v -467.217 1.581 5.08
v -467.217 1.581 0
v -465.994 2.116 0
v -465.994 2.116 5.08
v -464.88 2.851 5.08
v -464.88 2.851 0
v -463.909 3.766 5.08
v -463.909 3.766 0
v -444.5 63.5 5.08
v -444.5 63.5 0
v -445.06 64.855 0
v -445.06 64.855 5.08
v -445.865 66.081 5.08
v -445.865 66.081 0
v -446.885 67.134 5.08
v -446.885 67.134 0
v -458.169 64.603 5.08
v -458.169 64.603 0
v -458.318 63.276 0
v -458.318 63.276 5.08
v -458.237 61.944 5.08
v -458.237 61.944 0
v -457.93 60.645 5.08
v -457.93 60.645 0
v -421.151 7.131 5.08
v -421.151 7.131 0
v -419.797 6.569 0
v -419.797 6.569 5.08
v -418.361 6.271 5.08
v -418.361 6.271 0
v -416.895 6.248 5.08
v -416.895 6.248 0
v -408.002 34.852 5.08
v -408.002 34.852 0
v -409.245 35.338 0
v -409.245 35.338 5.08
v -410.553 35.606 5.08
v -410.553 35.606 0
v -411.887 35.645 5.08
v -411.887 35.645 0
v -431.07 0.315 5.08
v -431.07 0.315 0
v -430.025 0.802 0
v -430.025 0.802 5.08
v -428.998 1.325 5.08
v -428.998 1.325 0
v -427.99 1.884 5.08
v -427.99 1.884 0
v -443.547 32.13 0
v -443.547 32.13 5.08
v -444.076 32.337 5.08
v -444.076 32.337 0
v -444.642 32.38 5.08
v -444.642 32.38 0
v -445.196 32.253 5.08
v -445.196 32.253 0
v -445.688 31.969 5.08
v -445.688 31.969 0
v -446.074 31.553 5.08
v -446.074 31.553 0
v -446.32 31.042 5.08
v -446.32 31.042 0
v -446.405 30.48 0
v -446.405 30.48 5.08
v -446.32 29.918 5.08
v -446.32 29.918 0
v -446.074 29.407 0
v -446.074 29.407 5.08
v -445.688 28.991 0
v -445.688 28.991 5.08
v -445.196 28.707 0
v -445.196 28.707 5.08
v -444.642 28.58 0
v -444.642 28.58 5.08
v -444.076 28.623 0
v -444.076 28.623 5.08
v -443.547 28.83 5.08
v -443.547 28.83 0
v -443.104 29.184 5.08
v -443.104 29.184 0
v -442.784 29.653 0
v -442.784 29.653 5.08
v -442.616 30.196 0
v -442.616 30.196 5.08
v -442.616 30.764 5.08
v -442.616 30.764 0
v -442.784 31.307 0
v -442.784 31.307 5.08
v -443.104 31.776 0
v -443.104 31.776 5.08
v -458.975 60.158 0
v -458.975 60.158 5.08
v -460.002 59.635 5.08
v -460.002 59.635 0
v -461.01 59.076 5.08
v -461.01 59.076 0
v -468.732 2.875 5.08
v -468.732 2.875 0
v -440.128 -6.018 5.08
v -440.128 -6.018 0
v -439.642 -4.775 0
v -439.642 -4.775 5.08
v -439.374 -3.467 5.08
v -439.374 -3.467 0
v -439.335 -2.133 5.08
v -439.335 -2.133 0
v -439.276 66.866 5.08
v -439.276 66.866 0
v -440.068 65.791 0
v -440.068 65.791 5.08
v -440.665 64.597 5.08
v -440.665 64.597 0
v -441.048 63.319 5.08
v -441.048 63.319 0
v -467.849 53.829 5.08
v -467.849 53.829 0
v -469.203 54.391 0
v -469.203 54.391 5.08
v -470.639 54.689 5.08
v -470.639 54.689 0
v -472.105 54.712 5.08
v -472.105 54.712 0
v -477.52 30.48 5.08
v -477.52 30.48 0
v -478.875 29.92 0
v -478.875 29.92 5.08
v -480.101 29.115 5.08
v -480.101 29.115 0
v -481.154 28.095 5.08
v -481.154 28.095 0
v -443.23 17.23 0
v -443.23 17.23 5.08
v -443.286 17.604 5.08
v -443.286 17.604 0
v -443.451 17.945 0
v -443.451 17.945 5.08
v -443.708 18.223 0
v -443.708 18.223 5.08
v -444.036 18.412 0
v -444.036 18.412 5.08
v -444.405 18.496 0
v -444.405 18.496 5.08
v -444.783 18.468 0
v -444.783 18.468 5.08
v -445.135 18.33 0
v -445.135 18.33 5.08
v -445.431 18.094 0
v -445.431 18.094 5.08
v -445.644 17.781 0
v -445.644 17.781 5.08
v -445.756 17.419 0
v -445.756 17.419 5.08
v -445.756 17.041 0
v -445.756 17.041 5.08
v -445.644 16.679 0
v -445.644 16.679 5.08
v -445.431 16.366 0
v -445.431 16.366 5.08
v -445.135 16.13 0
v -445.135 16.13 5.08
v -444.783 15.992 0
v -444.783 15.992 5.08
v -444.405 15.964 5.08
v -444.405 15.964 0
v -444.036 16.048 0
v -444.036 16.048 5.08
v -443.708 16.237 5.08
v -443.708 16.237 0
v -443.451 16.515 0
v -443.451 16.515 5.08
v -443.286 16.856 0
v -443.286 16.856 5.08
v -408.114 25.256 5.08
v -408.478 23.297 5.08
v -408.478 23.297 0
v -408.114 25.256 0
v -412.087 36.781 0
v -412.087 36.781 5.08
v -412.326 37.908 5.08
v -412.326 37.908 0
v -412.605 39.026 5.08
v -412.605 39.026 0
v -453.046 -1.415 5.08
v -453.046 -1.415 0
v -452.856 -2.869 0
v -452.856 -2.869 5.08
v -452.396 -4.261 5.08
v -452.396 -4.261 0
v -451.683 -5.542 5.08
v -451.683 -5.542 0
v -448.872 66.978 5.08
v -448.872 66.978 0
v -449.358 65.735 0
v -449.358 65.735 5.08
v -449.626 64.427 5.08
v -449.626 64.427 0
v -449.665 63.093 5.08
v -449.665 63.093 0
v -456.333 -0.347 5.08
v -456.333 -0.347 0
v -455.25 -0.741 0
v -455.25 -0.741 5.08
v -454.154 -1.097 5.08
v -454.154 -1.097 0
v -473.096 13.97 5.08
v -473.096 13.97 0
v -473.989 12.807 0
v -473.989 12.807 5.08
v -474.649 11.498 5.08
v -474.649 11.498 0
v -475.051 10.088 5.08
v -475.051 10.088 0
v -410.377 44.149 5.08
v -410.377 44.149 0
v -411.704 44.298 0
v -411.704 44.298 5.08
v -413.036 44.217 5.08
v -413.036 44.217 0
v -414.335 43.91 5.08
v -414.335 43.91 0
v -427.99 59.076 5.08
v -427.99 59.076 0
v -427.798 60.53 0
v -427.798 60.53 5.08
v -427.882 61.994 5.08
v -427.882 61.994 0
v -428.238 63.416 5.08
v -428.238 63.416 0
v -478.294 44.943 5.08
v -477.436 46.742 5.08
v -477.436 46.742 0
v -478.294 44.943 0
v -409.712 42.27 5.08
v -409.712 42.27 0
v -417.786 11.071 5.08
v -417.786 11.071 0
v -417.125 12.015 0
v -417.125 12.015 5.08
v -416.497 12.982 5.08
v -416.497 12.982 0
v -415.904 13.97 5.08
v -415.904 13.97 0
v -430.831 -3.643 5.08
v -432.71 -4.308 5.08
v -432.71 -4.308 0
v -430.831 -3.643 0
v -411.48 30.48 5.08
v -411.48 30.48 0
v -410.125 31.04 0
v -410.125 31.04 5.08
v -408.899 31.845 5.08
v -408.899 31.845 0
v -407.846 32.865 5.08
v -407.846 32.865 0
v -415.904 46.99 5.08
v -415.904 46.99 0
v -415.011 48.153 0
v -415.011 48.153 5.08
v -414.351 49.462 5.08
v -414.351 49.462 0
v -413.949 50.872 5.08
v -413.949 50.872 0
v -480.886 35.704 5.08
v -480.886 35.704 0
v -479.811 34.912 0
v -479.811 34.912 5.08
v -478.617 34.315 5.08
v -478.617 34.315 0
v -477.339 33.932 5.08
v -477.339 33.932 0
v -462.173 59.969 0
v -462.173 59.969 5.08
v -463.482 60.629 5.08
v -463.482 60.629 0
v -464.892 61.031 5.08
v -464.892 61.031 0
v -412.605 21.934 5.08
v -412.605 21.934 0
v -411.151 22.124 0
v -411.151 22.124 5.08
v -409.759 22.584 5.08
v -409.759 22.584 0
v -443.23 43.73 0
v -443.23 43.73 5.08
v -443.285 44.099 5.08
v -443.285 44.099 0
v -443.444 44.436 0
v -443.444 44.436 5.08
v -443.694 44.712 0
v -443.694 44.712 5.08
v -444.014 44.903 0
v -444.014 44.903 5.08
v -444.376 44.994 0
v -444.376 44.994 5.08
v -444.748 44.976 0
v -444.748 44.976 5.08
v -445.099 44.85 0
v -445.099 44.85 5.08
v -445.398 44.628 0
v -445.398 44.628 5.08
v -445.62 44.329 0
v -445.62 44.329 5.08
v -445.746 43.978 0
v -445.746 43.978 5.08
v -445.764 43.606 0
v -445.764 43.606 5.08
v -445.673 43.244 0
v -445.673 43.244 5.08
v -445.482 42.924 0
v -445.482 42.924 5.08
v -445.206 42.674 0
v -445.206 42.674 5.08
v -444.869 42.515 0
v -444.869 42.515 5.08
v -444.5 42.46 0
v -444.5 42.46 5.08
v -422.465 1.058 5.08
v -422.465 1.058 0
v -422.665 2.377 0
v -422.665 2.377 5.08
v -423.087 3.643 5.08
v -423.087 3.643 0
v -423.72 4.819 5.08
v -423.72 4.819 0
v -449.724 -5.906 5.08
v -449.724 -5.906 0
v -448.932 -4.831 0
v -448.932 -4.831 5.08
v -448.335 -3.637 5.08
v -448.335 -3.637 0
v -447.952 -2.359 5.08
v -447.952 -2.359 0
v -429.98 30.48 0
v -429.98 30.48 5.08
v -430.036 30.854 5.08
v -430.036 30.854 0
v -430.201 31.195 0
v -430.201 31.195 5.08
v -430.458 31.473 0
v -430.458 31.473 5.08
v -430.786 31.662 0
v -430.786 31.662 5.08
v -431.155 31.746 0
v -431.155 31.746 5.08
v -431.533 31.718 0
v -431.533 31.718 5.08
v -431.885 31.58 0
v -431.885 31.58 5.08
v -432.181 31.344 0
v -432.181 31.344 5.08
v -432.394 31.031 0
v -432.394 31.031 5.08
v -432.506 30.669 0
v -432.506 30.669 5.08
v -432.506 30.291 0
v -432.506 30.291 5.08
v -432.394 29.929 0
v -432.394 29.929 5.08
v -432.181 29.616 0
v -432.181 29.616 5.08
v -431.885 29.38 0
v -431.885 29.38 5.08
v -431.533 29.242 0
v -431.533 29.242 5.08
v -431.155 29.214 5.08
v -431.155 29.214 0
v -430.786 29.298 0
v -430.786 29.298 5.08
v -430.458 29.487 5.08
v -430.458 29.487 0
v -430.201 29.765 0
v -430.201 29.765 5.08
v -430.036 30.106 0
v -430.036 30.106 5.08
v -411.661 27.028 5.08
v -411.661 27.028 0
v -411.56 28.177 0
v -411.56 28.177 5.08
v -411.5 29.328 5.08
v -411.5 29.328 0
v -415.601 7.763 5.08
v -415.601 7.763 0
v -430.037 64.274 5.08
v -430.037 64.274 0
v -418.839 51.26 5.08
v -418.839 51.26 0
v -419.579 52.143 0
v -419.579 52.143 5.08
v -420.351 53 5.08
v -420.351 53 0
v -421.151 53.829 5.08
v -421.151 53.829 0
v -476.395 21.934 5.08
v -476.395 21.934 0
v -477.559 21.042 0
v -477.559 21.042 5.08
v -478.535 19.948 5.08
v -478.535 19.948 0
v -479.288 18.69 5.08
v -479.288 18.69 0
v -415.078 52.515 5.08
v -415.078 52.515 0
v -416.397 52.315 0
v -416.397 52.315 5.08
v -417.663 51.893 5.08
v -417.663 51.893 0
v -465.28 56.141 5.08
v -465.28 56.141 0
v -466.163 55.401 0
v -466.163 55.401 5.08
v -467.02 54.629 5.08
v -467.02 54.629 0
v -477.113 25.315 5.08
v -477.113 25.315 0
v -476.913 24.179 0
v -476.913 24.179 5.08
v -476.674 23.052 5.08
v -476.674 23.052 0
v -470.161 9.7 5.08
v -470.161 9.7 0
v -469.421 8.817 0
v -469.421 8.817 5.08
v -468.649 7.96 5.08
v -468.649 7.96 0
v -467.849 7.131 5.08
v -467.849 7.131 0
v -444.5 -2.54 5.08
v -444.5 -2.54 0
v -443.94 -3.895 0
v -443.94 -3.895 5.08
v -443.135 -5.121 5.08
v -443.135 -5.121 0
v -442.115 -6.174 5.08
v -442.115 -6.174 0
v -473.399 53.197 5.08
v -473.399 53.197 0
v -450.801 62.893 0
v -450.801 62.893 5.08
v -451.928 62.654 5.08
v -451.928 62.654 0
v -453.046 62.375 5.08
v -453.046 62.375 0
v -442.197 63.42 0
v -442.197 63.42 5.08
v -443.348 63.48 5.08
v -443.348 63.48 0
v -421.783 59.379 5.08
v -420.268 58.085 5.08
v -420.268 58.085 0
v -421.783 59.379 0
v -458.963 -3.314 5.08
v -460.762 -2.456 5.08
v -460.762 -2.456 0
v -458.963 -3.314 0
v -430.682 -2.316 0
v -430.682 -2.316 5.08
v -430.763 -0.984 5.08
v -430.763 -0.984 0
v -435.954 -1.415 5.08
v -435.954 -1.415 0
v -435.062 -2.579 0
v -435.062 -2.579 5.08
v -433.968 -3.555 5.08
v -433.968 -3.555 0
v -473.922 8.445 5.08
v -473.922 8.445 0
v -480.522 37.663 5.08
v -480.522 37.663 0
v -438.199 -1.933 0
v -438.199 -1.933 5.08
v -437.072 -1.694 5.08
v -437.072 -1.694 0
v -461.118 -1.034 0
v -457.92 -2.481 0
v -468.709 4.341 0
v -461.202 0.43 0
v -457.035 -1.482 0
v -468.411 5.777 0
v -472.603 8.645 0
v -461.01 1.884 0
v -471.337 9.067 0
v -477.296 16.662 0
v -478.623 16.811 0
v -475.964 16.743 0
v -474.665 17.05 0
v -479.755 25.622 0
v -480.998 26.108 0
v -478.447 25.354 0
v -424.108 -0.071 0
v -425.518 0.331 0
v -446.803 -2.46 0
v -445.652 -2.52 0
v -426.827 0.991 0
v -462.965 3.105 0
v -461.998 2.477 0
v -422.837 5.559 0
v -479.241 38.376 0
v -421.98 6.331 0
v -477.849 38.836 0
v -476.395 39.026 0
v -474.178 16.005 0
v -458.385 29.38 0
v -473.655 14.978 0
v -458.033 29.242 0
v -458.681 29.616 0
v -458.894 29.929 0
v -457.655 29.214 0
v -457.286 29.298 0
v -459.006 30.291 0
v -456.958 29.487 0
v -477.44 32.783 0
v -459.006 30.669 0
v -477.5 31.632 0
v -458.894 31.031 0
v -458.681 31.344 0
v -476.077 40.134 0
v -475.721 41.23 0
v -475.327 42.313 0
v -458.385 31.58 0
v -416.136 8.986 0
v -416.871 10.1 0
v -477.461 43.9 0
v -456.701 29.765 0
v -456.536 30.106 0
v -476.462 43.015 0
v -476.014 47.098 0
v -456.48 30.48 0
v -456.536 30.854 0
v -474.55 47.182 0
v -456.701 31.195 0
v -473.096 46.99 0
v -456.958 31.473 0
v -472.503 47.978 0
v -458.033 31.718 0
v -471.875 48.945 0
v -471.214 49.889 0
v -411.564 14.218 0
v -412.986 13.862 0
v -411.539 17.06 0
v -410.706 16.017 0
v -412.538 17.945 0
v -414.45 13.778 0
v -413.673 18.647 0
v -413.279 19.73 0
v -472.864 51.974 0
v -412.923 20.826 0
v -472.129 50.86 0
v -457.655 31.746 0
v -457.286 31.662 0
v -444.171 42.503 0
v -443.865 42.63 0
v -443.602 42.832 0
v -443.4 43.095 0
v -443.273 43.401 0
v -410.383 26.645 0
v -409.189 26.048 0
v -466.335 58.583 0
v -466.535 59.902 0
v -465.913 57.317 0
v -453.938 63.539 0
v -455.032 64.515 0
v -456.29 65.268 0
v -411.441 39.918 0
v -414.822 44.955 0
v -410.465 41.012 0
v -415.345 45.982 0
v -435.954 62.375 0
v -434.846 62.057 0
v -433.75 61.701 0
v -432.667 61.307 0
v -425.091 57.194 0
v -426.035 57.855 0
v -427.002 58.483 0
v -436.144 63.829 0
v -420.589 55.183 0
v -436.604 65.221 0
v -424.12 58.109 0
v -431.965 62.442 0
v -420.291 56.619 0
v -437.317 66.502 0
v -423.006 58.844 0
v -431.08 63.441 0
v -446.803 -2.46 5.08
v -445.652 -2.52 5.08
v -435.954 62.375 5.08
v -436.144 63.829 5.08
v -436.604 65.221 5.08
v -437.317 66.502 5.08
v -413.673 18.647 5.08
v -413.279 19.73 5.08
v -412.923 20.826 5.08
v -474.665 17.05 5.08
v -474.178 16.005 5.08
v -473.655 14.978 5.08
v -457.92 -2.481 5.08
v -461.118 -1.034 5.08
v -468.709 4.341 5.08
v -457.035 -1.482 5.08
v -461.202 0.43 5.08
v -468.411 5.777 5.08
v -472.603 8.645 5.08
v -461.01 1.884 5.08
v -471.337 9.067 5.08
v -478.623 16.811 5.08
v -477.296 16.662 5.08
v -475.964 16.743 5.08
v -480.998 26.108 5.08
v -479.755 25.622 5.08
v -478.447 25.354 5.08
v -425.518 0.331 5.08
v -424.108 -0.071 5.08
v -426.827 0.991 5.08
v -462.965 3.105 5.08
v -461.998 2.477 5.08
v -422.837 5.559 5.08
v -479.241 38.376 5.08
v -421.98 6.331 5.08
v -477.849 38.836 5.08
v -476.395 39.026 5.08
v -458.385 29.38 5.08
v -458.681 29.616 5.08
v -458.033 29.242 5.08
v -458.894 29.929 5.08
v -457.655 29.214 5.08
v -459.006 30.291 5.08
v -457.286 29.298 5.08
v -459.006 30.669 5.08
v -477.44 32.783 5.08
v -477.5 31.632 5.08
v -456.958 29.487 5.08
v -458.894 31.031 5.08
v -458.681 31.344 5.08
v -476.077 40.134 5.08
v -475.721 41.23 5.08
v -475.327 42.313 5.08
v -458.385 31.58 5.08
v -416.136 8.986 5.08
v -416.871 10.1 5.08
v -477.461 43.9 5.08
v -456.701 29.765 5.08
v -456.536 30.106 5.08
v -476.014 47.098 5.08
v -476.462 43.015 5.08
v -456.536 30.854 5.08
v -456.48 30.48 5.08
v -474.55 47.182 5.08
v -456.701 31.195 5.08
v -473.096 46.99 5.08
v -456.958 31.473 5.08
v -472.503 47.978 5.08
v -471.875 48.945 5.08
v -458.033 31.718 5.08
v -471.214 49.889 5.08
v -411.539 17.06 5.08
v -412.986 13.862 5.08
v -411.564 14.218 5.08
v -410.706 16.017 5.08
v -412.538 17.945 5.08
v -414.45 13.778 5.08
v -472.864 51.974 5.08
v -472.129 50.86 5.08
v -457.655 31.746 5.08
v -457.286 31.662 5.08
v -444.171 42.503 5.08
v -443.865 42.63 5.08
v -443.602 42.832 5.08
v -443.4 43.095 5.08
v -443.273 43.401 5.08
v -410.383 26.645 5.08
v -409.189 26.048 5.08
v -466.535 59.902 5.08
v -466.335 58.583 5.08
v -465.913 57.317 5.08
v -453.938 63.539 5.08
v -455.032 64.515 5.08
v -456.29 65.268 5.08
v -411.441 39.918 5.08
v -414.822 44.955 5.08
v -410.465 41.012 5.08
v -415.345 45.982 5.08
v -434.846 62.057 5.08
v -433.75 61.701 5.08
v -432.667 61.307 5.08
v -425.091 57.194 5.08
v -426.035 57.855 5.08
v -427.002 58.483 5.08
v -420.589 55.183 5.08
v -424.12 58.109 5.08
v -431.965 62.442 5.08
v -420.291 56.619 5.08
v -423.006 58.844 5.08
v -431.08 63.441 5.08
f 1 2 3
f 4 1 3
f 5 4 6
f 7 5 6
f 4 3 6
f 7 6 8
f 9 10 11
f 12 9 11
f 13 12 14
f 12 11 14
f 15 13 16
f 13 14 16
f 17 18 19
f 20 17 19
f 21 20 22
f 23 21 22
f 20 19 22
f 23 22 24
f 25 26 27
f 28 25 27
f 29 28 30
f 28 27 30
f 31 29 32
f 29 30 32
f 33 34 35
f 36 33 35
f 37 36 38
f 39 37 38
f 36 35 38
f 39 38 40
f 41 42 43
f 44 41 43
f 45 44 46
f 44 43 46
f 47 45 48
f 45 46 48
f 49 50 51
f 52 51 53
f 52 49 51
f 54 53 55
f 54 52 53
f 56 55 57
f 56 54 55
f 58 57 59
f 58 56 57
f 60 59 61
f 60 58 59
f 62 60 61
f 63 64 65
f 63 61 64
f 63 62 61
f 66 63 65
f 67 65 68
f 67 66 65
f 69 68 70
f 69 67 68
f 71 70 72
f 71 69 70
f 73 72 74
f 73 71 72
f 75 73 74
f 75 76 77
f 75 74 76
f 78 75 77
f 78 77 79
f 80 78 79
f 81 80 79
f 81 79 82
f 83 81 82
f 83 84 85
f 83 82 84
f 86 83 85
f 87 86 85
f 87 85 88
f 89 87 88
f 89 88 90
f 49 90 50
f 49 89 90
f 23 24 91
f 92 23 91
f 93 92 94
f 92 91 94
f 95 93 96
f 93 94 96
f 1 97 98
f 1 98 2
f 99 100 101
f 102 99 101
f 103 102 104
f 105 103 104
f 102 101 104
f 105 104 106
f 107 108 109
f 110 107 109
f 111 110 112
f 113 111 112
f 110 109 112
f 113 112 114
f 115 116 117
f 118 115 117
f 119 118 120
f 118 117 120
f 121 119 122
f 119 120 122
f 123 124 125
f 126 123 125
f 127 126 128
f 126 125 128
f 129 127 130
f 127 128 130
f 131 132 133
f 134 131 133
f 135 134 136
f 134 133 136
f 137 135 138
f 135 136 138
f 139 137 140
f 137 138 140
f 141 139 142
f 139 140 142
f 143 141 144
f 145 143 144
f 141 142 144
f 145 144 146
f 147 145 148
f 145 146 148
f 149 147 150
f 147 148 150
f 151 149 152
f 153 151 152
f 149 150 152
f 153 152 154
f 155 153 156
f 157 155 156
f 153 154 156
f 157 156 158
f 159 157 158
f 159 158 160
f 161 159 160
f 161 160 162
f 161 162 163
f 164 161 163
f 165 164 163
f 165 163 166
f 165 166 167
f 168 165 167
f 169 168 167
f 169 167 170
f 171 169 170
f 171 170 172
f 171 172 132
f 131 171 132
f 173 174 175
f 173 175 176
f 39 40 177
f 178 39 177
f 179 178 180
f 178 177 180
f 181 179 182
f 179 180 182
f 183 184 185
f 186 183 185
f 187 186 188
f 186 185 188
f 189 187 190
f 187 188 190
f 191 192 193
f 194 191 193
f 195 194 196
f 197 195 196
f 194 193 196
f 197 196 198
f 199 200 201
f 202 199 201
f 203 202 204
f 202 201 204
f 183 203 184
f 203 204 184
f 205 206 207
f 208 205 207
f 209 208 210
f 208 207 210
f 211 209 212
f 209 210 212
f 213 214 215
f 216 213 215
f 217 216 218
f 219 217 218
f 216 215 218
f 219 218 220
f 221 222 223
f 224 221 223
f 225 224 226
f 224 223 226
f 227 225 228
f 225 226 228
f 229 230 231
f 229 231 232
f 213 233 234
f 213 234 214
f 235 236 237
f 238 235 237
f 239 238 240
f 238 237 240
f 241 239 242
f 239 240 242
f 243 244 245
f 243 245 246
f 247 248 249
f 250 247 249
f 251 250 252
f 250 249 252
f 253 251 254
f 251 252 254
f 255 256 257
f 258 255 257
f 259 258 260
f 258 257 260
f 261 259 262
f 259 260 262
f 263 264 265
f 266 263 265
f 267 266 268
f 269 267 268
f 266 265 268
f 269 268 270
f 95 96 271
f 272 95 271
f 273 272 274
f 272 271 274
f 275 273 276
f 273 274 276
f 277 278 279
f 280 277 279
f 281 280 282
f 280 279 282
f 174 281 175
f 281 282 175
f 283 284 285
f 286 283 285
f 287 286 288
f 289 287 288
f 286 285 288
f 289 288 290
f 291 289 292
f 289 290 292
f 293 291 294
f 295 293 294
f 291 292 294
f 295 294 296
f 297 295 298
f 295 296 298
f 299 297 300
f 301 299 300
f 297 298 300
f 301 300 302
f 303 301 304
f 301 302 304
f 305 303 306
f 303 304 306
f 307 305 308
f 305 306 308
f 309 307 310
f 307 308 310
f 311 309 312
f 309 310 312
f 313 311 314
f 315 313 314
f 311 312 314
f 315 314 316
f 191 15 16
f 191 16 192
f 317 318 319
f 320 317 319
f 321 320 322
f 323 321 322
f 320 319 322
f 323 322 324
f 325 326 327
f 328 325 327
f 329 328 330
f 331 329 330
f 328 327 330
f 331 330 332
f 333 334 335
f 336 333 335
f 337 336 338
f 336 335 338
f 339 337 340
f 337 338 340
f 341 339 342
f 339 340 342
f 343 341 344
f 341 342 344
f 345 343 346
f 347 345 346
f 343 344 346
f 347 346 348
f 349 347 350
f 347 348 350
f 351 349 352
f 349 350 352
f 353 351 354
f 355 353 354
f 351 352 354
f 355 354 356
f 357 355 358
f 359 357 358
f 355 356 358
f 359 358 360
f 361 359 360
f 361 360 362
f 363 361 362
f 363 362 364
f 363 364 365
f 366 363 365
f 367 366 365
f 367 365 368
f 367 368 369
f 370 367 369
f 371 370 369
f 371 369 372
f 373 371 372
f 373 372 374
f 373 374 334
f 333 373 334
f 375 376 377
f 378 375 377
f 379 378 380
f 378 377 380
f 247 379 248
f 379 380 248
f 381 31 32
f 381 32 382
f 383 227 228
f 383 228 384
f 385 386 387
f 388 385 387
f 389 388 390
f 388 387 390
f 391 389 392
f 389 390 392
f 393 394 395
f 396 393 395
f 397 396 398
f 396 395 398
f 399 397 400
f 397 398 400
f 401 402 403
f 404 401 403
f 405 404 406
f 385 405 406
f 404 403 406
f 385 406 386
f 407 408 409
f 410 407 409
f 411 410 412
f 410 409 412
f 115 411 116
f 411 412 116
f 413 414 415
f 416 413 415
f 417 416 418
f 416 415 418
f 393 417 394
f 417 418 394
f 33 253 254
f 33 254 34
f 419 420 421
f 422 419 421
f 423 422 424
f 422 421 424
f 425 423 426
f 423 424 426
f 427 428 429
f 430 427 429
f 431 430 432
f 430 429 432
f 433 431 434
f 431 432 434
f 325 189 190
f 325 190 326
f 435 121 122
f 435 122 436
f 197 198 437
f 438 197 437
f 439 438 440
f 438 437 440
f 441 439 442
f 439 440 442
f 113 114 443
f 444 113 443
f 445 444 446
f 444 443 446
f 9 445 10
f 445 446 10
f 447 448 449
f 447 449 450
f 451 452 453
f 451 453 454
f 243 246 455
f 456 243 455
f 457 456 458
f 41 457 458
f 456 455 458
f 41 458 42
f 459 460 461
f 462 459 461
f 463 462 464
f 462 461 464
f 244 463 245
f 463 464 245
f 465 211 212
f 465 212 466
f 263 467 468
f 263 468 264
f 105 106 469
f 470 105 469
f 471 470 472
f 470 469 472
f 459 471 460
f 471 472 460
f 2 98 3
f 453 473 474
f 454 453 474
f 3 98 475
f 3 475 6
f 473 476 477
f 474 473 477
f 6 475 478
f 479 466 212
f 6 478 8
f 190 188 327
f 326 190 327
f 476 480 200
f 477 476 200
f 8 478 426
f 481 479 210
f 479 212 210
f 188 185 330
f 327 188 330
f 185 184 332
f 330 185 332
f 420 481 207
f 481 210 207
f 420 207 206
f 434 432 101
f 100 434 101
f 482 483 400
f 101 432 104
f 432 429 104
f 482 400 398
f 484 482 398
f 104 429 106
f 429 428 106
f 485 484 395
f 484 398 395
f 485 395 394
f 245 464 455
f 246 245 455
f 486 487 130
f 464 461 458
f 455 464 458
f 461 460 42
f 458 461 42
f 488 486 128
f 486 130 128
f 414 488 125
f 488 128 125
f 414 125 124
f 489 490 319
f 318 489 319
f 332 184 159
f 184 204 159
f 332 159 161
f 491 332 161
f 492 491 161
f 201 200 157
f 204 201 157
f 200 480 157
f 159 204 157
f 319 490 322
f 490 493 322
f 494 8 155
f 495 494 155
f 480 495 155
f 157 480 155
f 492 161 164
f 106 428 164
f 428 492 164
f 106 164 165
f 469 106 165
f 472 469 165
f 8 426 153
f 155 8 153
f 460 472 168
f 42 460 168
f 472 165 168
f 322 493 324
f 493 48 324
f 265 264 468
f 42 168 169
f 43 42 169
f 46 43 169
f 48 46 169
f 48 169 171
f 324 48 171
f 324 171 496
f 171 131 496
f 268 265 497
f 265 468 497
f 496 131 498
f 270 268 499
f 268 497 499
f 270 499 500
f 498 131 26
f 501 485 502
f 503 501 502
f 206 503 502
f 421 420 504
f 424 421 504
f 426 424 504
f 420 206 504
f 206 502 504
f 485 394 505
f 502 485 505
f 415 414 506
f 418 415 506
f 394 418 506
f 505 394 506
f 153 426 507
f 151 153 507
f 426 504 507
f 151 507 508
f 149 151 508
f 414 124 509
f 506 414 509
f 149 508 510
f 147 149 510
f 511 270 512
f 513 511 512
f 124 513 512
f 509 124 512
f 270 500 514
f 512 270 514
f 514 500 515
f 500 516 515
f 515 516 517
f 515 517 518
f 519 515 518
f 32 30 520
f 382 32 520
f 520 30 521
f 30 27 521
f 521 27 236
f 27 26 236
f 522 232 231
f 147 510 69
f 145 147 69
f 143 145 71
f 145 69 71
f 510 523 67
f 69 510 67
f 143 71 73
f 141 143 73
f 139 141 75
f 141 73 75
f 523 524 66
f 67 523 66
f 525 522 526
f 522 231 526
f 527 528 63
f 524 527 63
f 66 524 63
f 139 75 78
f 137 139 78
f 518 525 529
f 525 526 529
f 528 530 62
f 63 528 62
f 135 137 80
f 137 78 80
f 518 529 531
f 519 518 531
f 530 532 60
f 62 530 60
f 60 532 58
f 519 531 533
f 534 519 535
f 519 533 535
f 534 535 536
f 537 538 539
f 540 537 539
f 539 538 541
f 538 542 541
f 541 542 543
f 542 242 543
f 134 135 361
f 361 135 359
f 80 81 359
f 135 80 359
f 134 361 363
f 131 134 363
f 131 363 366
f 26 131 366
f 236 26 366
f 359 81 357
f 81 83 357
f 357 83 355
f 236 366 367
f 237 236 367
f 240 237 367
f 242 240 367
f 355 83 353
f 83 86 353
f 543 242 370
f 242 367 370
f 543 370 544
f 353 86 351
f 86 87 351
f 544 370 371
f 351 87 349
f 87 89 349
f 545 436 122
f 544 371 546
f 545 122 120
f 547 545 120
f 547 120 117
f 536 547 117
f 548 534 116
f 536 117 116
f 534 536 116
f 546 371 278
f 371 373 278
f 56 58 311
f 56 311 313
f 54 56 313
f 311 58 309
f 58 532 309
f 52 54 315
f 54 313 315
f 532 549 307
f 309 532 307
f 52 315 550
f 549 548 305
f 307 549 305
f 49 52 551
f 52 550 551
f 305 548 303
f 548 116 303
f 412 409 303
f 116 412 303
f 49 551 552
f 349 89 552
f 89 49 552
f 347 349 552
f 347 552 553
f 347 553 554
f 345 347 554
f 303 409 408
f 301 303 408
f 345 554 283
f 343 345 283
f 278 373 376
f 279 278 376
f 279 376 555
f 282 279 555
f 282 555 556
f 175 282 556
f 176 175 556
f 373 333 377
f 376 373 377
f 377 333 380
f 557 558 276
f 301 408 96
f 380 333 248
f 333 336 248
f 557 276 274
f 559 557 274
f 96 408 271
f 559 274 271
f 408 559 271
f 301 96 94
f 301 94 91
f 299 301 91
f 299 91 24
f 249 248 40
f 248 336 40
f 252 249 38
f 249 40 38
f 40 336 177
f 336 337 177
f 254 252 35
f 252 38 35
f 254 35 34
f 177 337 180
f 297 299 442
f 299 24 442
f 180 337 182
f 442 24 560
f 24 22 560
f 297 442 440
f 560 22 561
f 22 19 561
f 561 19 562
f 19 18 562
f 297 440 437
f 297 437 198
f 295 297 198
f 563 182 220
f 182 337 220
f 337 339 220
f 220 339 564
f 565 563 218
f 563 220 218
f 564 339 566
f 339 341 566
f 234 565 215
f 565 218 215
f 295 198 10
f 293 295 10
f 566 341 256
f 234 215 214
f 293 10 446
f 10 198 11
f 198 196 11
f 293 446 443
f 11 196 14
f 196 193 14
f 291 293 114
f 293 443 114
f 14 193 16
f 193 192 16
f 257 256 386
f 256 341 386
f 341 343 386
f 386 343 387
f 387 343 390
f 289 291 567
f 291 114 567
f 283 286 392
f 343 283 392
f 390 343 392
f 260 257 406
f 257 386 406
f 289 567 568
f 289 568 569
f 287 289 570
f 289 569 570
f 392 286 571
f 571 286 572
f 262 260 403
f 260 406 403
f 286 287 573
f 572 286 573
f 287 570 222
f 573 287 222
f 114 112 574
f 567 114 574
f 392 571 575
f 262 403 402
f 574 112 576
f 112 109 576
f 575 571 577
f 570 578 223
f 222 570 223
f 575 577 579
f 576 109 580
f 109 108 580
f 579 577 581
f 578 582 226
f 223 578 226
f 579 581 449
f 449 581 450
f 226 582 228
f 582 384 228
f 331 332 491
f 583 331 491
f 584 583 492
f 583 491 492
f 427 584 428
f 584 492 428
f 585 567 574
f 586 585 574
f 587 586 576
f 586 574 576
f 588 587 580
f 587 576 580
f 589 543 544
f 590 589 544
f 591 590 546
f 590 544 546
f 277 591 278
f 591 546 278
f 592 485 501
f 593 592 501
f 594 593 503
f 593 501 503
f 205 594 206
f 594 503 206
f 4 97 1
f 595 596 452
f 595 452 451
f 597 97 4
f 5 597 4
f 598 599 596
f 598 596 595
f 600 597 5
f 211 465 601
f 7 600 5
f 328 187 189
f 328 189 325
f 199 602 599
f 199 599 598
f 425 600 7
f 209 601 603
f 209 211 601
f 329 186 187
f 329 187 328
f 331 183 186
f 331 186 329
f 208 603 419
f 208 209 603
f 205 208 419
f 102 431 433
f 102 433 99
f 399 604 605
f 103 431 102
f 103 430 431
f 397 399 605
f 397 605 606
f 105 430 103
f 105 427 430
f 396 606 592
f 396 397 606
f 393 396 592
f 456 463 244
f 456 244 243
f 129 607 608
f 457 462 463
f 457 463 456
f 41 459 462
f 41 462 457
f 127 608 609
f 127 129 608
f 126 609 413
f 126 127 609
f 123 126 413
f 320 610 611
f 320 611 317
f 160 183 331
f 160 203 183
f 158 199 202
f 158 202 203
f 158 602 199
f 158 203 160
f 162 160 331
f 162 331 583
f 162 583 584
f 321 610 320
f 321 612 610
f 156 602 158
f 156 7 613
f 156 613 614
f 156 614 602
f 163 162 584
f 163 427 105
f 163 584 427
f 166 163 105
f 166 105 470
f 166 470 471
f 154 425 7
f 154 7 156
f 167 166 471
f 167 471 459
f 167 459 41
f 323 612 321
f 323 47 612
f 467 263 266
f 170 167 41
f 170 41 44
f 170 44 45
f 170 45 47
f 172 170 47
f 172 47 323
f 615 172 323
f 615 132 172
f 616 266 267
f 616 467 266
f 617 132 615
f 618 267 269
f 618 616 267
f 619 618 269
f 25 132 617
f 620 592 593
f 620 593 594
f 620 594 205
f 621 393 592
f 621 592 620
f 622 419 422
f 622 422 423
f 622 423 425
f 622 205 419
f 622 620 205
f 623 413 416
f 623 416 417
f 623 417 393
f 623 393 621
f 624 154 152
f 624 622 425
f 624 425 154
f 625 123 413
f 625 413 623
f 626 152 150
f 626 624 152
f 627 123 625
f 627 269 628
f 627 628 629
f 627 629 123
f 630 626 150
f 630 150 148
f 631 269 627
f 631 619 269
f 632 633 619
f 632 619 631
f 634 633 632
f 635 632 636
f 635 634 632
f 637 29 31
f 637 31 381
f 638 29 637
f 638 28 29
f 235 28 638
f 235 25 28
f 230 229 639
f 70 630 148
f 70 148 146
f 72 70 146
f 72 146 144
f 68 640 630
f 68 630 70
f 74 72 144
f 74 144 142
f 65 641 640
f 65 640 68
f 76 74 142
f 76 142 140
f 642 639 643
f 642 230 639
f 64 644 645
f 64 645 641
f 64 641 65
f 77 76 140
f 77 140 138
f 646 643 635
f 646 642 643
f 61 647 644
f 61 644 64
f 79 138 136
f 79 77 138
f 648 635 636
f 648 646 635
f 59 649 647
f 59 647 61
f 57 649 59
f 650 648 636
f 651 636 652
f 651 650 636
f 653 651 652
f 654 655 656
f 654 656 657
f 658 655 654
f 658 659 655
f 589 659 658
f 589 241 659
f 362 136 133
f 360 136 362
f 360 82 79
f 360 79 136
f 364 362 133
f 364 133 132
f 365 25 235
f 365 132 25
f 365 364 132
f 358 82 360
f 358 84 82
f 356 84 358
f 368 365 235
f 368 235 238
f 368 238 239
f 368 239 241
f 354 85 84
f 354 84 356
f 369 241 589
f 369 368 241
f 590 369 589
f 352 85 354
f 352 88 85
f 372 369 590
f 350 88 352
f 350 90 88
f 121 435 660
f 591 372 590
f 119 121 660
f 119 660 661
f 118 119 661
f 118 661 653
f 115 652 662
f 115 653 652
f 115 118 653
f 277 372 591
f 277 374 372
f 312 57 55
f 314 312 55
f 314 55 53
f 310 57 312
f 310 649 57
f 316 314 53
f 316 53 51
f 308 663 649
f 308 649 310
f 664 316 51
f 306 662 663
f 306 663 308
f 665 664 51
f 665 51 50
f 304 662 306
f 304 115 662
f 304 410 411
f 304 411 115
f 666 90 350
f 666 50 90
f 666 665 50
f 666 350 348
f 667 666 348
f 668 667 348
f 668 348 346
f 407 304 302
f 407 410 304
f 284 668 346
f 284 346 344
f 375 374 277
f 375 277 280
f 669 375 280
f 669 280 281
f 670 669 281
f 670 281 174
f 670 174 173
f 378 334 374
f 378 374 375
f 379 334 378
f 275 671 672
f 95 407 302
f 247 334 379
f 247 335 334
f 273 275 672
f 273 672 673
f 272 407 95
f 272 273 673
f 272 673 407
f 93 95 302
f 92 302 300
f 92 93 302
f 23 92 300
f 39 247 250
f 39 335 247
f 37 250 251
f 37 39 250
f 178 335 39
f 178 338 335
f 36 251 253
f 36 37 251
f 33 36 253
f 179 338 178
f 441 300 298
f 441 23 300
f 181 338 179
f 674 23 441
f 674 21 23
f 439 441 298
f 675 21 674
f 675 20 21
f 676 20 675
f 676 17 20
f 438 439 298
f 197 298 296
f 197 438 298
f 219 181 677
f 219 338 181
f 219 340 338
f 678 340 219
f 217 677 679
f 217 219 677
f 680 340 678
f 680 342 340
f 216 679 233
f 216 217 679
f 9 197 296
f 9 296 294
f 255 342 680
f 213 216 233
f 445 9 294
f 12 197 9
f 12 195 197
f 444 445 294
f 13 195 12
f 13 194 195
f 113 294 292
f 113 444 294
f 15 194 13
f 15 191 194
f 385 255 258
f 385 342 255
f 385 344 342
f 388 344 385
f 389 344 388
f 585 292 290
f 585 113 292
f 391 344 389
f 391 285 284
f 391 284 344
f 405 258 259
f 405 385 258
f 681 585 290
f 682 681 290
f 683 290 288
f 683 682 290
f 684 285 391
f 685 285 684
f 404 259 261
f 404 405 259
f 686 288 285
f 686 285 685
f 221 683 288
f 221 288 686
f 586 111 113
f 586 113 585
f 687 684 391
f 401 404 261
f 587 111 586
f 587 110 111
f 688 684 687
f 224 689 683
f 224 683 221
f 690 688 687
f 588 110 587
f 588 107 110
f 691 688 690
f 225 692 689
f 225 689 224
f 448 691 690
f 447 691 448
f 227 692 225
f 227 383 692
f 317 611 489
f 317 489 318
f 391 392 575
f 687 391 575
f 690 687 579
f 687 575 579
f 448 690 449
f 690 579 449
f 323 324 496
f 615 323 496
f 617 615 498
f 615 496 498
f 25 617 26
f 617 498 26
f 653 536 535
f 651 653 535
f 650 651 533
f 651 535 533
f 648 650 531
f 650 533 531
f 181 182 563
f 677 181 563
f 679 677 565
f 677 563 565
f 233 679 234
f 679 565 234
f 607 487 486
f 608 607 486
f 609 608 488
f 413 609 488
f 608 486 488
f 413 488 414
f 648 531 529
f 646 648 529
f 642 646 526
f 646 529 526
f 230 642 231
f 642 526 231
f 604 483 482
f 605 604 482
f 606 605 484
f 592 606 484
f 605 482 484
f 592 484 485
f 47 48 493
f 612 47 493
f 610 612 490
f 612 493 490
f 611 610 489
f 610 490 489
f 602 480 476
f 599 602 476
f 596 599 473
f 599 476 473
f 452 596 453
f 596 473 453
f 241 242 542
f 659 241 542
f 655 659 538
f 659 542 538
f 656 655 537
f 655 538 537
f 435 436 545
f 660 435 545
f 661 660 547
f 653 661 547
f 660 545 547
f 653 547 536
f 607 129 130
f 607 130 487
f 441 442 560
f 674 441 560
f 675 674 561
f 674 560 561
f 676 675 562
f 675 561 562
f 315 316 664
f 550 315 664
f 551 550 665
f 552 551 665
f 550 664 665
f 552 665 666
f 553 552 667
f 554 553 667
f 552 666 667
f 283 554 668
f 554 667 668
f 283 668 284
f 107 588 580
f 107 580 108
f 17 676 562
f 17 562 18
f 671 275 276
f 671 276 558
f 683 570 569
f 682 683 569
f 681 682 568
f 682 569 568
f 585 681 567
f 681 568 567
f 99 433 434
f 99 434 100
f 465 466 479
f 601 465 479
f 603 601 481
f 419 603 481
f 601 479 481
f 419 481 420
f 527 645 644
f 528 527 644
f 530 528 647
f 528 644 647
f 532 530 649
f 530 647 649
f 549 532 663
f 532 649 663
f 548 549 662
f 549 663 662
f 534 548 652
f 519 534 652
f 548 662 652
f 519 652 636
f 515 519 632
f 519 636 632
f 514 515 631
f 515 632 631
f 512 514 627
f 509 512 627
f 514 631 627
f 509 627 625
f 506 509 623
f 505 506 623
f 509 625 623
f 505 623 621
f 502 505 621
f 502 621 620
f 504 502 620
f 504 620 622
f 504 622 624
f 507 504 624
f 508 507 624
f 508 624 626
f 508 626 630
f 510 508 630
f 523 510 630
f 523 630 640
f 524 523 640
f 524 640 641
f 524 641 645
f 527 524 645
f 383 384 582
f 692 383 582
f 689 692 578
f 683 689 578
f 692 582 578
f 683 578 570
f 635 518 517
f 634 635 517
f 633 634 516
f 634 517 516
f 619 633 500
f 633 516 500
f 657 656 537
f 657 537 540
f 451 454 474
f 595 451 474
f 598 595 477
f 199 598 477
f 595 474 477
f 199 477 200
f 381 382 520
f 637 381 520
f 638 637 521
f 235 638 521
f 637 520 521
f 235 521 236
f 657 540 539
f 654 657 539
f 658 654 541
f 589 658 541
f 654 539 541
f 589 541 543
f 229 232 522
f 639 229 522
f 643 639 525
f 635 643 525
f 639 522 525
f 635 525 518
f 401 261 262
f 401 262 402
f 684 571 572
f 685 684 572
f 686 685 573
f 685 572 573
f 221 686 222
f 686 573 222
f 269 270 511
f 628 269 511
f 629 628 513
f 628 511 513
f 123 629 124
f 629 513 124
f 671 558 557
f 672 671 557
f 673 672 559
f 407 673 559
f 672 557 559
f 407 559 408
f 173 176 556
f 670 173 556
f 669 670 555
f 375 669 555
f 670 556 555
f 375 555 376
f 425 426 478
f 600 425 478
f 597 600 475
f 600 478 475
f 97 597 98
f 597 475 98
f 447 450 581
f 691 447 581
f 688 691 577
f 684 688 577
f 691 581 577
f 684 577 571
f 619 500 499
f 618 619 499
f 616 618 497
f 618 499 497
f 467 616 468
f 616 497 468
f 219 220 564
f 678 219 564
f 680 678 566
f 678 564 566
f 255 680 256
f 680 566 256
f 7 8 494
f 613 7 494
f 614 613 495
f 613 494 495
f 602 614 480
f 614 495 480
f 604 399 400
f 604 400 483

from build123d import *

# Parameters (mm, degrees)
F0_R     = 1.905
F1_DEPTH = 5.08
F2_COUNT = 24
F5_R     = 1.27
F6_DEPTH = 25.4


with BuildPart() as f1:
    # F0 (on Top) → F1 (new body)
    with BuildSketch(Plane.XY):
        with BuildLine():
            ThreePointArc((-408.002278, 34.8517), (-409.893011, 35.500075), (-411.88653, 35.645465))
            ThreePointArc((-411.88653, 35.645465), (-477.41821, 27.88928), (-411.479999, 30.479999))
            ThreePointArc((-411.479999, 30.479999), (-409.493063, 31.413613), (-407.84592, 32.864982))
            Line((-407.84592, 32.864982), (-408.002278, 34.8517))
        make_face()
        with Locations((-444.499999, 30.479999)):
            Circle(F0_R, mode=Mode.SUBTRACT)
    extrude(amount=F1_DEPTH)


with BuildPart() as f2_1:
    # F2: instance of F1
    add(f1.part.rotate(Axis((-444.499999, 30.479999, 0), (0, 0, -1)), 1 * 360 / F2_COUNT))


with BuildPart() as f2_2:
    # F2: instance of F1
    add(f1.part.rotate(Axis((-444.499999, 30.479999, 0), (0, 0, -1)), 2 * 360 / F2_COUNT))


with BuildPart() as f2_3:
    # F2: instance of F1
    add(f1.part.rotate(Axis((-444.499999, 30.479999, 0), (0, 0, -1)), 3 * 360 / F2_COUNT))


with BuildPart() as f2_4:
    # F2: instance of F1
    add(f1.part.rotate(Axis((-444.499999, 30.479999, 0), (0, 0, -1)), 4 * 360 / F2_COUNT))


with BuildPart() as f2_5:
    # F2: instance of F1
    add(f1.part.rotate(Axis((-444.499999, 30.479999, 0), (0, 0, -1)), 5 * 360 / F2_COUNT))


with BuildPart() as f2_6:
    # F2: instance of F1
    add(f1.part.rotate(Axis((-444.499999, 30.479999, 0), (0, 0, -1)), 6 * 360 / F2_COUNT))


with BuildPart() as f2_7:
    # F2: instance of F1
    add(f1.part.rotate(Axis((-444.499999, 30.479999, 0), (0, 0, -1)), 7 * 360 / F2_COUNT))


with BuildPart() as f2_8:
    # F2: instance of F1
    add(f1.part.rotate(Axis((-444.499999, 30.479999, 0), (0, 0, -1)), 8 * 360 / F2_COUNT))


with BuildPart() as f2_9:
    # F2: instance of F1
    add(f1.part.rotate(Axis((-444.499999, 30.479999, 0), (0, 0, -1)), 9 * 360 / F2_COUNT))


with BuildPart() as f2_10:
    # F2: instance of F1
    add(f1.part.rotate(Axis((-444.499999, 30.479999, 0), (0, 0, -1)), 10 * 360 / F2_COUNT))


with BuildPart() as f2_11:
    # F2: instance of F1
    add(f1.part.rotate(Axis((-444.499999, 30.479999, 0), (0, 0, -1)), 11 * 360 / F2_COUNT))


with BuildPart() as f2_12:
    # F2: instance of F1
    add(f1.part.rotate(Axis((-444.499999, 30.479999, 0), (0, 0, -1)), 12 * 360 / F2_COUNT))


with BuildPart() as f2_13:
    # F2: instance of F1
    add(f1.part.rotate(Axis((-444.499999, 30.479999, 0), (0, 0, -1)), 13 * 360 / F2_COUNT))


with BuildPart() as f2_14:
    # F2: instance of F1
    add(f1.part.rotate(Axis((-444.499999, 30.479999, 0), (0, 0, -1)), 14 * 360 / F2_COUNT))


with BuildPart() as f2_15:
    # F2: instance of F1
    add(f1.part.rotate(Axis((-444.499999, 30.479999, 0), (0, 0, -1)), 15 * 360 / F2_COUNT))


with BuildPart() as f2_16:
    # F2: instance of F1
    add(f1.part.rotate(Axis((-444.499999, 30.479999, 0), (0, 0, -1)), 16 * 360 / F2_COUNT))


with BuildPart() as f2_17:
    # F2: instance of F1
    add(f1.part.rotate(Axis((-444.499999, 30.479999, 0), (0, 0, -1)), 17 * 360 / F2_COUNT))


with BuildPart() as f2_18:
    # F2: instance of F1
    add(f1.part.rotate(Axis((-444.499999, 30.479999, 0), (0, 0, -1)), 18 * 360 / F2_COUNT))


with BuildPart() as f2_19:
    # F2: instance of F1
    add(f1.part.rotate(Axis((-444.499999, 30.479999, 0), (0, 0, -1)), 19 * 360 / F2_COUNT))


with BuildPart() as f2_20:
    # F2: instance of F1
    add(f1.part.rotate(Axis((-444.499999, 30.479999, 0), (0, 0, -1)), 20 * 360 / F2_COUNT))


with BuildPart() as f2_21:
    # F2: instance of F1
    add(f1.part.rotate(Axis((-444.499999, 30.479999, 0), (0, 0, -1)), 21 * 360 / F2_COUNT))


with BuildPart() as f2_22:
    # F2: instance of F1
    add(f1.part.rotate(Axis((-444.499999, 30.479999, 0), (0, 0, -1)), 22 * 360 / F2_COUNT))


with BuildPart() as f2_23:
    # F2: instance of F1
    add(f1.part.rotate(Axis((-444.499999, 30.479999, 0), (0, 0, -1)), 23 * 360 / F2_COUNT))


with BuildPart() as f1_1:
    add(f1.part)

    # F3: union F2_1, F2_2, F2_3, F2_4, F2_5, F2_6, F2_11, F2_14, F2_12, F2_13, F2_19, F2_18, F2_17, F2_10, F2_16, F2_15, F2_9, F2_8, F2_7
    add(f2_1.part)
    add(f2_2.part)
    add(f2_3.part)
    add(f2_4.part)
    add(f2_5.part)
    add(f2_6.part)
    add(f2_11.part)
    add(f2_14.part)
    add(f2_12.part)
    add(f2_13.part)
    add(f2_19.part)
    add(f2_18.part)
    add(f2_17.part)
    add(f2_10.part)
    add(f2_16.part)
    add(f2_15.part)
    add(f2_9.part)
    add(f2_8.part)
    add(f2_7.part)


with BuildPart() as f2_20_1:
    add(f2_20.part)

    # F4: union F1, F2_21, F2_22, F2_23
    add(f1_1.part)
    add(f2_21.part)
    add(f2_22.part)
    add(f2_23.part)

    # F5 (on face) → F6 (cut)
    with BuildSketch(Plane.XY.offset(5.08)):
        with BuildLine():
            ThreePointArc((-443.229999, 43.729999), (-445.398025, 44.628025), (-444.499999, 42.459999))
            ThreePointArc((-444.499999, 42.459999), (-443.601974, 42.831974), (-443.229999, 43.729999))
        make_face()
        with Locations((-431.249999, 30.479999)):
            Circle(F5_R)
        with Locations((-444.499999, 17.229999)):
            Circle(F5_R)
        with Locations((-457.749999, 30.479999)):
            Circle(F5_R)
    extrude(amount=-F6_DEPTH, mode=Mode.SUBTRACT)


solid = f2_20_1.part
